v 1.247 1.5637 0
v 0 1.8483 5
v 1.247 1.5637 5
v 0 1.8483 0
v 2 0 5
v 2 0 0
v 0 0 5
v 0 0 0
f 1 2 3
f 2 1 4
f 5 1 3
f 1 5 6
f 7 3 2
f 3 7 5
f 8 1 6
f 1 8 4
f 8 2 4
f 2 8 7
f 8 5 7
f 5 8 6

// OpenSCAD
// Generated by generate_scads.py
intersection() {
  cylinder(h=20, r=2, center=true);
  cube(size=[25,5,5], center=false);
}
